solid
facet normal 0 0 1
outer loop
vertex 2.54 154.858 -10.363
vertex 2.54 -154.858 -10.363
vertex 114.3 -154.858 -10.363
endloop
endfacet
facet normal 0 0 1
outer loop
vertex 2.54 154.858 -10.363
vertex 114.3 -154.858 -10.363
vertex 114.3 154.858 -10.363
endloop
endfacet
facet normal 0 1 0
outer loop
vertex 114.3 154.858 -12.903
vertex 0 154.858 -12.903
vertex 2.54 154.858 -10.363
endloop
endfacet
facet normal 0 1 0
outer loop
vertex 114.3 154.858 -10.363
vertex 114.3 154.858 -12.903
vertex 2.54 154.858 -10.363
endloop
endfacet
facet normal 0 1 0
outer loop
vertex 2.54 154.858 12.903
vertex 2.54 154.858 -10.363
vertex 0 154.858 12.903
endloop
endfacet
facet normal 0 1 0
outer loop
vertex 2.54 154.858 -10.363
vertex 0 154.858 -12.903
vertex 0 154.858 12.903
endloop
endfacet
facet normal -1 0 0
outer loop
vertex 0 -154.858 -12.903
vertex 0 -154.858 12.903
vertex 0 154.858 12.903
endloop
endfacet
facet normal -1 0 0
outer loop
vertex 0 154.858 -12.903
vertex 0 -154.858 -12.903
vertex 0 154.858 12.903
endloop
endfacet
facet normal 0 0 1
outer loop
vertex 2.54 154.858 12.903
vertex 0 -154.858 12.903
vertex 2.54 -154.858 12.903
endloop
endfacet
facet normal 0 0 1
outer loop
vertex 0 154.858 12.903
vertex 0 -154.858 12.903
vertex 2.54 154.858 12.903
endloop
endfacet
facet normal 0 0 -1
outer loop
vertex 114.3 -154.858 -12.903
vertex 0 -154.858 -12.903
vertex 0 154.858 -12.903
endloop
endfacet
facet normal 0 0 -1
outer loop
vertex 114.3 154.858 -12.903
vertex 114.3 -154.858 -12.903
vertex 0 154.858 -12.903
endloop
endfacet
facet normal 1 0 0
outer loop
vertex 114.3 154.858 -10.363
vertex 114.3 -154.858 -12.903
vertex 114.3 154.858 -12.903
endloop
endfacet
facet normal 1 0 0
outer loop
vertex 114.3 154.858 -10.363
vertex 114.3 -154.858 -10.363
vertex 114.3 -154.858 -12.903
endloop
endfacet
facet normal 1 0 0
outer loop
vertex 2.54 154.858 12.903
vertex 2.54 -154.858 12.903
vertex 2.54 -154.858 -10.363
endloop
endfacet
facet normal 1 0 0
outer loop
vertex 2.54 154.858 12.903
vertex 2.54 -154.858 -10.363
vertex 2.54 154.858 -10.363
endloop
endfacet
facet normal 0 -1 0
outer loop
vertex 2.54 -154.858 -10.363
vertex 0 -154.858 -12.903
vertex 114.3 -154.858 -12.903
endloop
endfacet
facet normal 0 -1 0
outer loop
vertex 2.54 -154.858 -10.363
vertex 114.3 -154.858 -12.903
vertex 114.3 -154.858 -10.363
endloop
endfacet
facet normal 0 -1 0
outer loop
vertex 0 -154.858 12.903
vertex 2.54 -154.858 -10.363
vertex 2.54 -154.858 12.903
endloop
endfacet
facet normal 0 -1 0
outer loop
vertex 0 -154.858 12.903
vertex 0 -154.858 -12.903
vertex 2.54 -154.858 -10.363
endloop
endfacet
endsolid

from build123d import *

# Parameters (mm, degrees)
F0_W     = 309.716136
F0_H     = 25.80601
F1_DEPTH = 114.3
F2_T     = -2.54


with BuildPart() as f1:
    # F0 (on Right) → F1 (new body)
    with BuildSketch(Plane.YZ):
        Rectangle(F0_W, F0_H)
    extrude(amount=F1_DEPTH)

    # F2
    f2_openings = [f1.faces().sort_by_distance(p)[0] for p in [
        (57.15, -154.858068, 0),
        (57.15, 0, 12.903005),
        (114.3, 0, 0),
        (57.15, 154.858068, 0),
    ]]
    offset(amount=F2_T, openings=f2_openings)


solid = f1.part
